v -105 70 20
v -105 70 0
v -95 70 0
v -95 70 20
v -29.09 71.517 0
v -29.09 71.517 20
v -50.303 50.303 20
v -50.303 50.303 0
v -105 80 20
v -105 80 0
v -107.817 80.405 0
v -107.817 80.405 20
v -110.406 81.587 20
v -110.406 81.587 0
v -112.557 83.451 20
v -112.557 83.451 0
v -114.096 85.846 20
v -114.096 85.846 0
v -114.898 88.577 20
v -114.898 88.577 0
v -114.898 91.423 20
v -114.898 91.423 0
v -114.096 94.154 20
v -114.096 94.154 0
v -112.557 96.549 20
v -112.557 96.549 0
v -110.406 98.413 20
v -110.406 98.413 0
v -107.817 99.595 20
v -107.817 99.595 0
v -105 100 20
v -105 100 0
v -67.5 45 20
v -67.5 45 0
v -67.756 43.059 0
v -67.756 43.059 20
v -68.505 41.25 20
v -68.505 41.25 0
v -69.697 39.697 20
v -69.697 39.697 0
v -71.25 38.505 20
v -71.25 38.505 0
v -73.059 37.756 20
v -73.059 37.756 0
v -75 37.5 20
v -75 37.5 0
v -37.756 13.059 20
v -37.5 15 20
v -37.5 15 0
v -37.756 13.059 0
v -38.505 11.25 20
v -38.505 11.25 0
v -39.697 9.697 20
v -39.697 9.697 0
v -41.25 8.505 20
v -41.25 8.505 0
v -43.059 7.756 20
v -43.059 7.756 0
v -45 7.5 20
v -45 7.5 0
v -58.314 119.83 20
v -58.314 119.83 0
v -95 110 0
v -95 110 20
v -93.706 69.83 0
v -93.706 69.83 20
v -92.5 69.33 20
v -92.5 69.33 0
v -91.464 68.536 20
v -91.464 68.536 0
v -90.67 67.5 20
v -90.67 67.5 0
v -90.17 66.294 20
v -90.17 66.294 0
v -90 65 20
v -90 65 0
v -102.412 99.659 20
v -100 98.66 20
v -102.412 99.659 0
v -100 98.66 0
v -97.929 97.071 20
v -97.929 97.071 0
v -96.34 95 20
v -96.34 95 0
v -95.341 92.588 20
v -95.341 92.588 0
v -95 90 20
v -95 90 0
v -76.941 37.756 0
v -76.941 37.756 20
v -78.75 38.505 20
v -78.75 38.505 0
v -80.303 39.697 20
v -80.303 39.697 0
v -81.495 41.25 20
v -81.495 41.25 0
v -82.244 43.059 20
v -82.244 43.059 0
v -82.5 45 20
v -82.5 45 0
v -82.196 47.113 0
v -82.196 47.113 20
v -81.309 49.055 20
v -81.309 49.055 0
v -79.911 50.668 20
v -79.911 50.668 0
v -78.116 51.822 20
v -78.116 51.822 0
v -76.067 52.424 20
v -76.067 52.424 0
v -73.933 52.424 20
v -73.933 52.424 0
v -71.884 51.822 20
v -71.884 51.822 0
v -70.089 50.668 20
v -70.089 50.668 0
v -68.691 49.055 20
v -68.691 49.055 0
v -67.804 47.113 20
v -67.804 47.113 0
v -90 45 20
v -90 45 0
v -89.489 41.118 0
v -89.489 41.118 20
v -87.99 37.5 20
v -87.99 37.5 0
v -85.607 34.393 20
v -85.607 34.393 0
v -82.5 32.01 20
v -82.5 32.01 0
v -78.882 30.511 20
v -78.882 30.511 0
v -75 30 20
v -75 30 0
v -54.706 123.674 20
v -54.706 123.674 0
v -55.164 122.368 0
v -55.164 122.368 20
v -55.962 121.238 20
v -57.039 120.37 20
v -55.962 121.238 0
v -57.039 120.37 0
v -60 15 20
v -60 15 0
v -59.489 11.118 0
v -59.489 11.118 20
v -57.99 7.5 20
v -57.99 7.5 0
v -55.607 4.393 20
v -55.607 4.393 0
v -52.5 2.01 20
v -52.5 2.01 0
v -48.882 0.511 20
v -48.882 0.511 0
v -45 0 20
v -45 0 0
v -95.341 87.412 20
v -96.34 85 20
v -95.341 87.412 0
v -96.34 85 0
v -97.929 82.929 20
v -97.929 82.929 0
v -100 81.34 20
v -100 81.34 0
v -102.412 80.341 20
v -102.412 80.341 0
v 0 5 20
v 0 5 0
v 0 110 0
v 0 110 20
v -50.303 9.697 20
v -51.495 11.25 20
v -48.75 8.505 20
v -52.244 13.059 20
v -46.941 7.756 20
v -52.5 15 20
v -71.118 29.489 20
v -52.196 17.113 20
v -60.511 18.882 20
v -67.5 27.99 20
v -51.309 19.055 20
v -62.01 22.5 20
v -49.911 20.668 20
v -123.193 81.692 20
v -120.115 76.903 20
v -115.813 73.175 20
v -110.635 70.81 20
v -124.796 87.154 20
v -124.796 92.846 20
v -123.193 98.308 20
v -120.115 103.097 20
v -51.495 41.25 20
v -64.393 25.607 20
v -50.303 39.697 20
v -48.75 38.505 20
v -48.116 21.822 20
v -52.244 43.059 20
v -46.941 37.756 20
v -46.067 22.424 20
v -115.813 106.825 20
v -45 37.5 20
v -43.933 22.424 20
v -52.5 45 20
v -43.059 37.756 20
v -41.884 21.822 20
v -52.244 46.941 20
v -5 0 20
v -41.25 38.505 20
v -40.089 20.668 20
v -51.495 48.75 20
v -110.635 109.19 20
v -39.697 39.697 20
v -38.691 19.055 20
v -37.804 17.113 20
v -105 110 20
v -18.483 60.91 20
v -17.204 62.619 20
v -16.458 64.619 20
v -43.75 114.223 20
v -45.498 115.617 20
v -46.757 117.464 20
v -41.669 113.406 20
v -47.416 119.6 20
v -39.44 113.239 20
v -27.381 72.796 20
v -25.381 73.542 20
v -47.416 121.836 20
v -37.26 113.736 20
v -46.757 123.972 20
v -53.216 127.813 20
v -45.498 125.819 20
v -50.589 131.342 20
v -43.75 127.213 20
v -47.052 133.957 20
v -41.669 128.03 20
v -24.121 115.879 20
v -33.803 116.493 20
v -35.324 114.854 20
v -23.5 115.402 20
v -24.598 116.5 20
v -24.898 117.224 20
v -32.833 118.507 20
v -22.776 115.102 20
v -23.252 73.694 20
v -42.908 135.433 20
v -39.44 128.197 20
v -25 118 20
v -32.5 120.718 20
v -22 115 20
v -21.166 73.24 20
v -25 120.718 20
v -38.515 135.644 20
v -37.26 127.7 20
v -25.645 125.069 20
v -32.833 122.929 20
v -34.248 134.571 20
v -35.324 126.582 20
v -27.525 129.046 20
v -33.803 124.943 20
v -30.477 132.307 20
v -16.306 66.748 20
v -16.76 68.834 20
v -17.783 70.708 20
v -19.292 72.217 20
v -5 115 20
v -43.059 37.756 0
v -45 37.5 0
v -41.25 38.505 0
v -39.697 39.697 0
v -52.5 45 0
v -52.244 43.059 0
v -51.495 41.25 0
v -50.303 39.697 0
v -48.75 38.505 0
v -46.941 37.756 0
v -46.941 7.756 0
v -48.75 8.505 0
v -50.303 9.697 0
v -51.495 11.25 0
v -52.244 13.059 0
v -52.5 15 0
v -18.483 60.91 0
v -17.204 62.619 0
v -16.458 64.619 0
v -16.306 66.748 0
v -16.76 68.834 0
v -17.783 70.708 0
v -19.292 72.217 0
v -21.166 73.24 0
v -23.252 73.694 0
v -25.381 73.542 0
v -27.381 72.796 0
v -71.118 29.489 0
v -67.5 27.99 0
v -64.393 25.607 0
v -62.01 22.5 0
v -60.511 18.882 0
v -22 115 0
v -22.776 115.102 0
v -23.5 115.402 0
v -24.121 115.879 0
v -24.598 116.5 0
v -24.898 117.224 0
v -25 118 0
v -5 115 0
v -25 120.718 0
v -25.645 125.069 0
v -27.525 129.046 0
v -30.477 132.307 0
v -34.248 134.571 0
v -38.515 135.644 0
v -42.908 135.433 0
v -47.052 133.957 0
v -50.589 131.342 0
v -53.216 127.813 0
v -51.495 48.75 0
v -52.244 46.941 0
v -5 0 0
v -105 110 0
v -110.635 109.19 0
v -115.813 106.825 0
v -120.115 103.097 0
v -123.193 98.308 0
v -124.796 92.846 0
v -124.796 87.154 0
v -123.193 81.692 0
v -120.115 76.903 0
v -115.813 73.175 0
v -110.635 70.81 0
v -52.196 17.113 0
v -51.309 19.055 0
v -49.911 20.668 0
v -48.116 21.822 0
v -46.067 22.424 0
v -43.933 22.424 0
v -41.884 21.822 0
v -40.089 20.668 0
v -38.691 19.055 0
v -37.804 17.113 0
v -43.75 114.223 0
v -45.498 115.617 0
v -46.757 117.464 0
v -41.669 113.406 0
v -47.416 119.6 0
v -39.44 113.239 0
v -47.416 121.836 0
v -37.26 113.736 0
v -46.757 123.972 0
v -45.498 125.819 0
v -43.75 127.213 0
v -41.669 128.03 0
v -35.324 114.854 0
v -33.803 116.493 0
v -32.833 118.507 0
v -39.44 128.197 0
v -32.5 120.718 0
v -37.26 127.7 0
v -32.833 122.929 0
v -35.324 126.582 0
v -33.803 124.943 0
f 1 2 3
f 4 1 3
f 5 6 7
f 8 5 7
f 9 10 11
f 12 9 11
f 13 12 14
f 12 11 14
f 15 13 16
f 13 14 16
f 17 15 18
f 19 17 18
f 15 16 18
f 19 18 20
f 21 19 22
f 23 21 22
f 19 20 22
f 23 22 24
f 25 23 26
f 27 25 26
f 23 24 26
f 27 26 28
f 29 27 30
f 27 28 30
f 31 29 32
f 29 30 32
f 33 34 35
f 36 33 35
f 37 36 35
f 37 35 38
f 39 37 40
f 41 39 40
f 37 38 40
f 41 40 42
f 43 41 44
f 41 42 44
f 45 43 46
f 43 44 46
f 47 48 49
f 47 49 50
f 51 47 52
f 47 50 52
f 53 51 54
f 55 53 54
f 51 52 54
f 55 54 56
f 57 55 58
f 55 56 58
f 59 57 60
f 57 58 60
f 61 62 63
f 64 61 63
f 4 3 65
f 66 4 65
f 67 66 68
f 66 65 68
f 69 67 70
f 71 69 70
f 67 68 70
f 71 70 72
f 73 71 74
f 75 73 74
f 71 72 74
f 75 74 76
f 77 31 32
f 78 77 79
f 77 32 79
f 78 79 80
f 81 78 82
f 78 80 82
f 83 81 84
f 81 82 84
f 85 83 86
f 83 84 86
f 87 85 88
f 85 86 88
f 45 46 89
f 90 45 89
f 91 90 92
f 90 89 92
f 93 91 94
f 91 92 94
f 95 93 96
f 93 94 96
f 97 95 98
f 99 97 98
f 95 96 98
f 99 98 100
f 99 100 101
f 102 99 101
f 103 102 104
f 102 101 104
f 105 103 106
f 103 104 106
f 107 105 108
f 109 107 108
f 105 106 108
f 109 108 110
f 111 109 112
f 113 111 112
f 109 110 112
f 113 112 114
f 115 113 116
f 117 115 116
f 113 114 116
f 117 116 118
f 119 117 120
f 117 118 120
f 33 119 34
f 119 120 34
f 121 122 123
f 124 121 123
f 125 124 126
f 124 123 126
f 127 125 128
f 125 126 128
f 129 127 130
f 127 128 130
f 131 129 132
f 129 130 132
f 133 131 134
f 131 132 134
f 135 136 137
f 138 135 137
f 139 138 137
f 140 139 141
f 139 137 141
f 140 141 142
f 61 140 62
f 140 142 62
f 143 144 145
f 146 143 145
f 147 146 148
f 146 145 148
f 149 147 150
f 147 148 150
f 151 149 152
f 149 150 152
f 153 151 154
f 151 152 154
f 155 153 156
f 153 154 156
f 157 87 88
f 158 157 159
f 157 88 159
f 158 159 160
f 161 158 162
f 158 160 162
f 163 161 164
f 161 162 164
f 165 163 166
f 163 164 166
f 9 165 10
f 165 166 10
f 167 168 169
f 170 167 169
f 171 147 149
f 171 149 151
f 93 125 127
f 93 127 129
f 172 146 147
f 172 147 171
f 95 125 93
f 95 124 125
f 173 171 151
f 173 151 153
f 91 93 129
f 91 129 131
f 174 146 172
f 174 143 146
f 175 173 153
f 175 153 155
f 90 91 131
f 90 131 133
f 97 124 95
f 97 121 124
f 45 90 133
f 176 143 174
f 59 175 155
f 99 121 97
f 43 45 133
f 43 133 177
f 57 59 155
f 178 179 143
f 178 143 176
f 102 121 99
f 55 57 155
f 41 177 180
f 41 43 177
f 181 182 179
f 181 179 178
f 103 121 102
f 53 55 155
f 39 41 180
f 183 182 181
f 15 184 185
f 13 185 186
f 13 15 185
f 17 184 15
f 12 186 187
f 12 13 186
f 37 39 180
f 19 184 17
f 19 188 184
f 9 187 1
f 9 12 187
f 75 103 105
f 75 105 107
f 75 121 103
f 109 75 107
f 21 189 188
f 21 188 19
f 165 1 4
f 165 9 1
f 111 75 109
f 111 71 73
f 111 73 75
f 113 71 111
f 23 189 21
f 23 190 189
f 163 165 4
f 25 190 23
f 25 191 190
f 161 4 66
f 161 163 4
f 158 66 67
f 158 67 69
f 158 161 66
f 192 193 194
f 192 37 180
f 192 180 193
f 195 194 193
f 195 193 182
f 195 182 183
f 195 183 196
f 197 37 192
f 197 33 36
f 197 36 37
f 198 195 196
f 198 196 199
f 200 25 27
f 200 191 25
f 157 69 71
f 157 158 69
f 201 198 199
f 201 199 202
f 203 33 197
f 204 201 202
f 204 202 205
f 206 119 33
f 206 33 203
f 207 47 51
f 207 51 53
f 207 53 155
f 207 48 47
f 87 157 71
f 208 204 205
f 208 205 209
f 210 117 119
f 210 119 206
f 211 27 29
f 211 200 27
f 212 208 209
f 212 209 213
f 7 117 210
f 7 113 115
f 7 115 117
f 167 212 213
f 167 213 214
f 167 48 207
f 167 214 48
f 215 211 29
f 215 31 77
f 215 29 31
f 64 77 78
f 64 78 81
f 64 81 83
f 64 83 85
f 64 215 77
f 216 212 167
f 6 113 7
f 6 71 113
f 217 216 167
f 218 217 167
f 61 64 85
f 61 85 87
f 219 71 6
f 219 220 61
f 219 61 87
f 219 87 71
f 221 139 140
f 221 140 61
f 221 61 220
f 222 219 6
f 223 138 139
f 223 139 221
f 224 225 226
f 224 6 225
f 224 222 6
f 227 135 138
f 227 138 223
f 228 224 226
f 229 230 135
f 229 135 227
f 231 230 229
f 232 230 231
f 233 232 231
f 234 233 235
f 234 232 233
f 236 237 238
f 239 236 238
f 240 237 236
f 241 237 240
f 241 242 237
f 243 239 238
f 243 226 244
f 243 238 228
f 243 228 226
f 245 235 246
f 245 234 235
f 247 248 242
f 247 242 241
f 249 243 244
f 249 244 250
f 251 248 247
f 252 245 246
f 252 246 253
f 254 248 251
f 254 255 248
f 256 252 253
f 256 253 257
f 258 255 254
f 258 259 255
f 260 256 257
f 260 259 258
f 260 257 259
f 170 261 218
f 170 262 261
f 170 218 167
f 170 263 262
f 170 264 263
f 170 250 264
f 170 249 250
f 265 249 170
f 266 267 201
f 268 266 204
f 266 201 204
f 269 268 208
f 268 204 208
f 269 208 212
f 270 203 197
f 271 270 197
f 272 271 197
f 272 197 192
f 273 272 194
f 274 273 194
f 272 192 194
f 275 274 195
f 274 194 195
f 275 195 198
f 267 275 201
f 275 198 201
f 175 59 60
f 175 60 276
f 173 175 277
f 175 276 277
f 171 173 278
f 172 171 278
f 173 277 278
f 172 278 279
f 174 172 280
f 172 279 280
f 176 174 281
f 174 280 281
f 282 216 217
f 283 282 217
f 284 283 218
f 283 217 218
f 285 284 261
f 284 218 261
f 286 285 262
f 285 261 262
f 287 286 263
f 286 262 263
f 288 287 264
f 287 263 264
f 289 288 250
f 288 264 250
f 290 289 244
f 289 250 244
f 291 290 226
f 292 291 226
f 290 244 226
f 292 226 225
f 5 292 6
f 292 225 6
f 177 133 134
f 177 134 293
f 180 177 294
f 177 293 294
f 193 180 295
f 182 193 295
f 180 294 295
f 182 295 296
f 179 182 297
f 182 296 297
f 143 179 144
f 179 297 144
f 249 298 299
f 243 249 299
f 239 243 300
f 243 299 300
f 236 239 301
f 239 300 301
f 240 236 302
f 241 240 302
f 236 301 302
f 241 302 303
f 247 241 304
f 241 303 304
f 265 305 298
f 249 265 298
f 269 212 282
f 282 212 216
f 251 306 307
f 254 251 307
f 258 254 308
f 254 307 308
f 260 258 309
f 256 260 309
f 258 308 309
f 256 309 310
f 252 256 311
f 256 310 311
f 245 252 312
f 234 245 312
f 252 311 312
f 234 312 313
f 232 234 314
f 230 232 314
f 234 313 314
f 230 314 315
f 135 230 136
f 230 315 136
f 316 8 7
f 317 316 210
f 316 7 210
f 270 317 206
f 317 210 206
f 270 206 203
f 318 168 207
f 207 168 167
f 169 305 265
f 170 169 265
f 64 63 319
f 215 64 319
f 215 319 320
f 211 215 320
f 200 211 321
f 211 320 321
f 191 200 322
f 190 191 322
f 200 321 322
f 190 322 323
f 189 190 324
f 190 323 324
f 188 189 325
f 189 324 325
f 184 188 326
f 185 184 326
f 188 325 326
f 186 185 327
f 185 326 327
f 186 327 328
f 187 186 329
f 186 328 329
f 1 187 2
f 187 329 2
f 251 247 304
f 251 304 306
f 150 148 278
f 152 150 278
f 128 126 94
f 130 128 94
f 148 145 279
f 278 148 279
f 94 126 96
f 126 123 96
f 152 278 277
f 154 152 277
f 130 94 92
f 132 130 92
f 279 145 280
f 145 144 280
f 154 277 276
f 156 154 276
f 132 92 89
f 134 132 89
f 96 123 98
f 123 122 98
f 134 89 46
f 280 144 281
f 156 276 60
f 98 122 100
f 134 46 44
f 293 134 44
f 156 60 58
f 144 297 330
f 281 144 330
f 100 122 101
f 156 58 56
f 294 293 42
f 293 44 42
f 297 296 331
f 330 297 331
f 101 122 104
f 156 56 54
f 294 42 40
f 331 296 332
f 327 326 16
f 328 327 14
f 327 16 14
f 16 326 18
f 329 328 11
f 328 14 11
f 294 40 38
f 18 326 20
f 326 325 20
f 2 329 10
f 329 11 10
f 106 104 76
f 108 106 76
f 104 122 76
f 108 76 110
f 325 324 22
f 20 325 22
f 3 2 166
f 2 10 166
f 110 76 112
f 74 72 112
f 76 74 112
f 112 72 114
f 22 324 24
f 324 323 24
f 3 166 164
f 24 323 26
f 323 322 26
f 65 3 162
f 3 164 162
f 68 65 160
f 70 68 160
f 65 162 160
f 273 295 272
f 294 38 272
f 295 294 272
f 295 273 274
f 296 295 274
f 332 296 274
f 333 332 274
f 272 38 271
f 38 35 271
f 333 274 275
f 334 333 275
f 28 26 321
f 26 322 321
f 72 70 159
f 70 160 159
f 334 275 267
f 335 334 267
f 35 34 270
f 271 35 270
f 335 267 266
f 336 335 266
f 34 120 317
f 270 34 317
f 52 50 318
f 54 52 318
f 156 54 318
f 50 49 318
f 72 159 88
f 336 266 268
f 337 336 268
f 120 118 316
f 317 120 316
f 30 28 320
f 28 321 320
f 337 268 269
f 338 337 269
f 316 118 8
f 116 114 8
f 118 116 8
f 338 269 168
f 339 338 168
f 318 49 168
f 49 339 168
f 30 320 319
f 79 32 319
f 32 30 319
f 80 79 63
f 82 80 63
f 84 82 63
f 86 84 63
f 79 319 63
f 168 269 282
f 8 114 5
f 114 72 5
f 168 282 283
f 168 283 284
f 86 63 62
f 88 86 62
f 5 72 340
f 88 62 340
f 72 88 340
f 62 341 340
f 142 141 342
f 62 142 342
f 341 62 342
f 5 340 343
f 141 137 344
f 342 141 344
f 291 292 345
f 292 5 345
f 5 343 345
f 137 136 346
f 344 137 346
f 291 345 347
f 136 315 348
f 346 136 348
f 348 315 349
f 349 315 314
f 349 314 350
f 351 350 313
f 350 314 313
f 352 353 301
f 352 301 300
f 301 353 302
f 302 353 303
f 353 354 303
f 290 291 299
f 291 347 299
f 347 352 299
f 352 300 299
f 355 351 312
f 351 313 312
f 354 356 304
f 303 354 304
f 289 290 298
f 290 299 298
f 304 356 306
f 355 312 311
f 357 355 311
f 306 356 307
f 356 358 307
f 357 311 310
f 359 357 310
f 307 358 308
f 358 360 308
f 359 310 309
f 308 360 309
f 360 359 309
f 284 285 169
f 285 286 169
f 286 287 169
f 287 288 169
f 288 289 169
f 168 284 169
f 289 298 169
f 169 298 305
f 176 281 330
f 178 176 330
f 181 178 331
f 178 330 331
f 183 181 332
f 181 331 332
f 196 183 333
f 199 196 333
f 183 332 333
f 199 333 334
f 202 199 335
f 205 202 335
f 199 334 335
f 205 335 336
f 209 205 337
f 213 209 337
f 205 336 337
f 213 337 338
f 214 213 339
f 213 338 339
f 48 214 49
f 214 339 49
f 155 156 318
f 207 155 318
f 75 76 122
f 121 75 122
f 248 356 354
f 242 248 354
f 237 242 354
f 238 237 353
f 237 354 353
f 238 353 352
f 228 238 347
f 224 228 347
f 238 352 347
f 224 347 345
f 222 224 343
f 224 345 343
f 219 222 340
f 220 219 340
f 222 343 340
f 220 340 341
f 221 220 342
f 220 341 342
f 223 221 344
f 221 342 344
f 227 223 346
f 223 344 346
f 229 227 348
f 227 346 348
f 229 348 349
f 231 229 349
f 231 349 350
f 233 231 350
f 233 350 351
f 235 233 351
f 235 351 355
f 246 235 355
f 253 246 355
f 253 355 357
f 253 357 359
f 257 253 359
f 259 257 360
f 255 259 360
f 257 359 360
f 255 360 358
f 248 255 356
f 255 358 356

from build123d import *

# Parameters (mm, degrees)
F1_DEPTH = 20
F2_SIZE  = 5
F4_DEPTH = 25


with BuildPart() as f1:
    # F0 (on Top) → F1 (new body)
    with BuildSketch(Plane.XY):
        with BuildLine():
            Line((-45, 0), (0, 0))
            Line((0, 0), (0, 115))
            Line((0, 115), (-22, 115))
            ThreePointArc((-22, 115), (-24.12132, 115.87868), (-25, 118))
            Line((-25, 118), (-25, 120.717968))
            ThreePointArc((-25, 120.717968), (-38.514543, 135.644234), (-54.705789, 123.674277))
            ThreePointArc((-54.705789, 123.674277), (-55.961881, 121.238038), (-58.313624, 119.830085))
            Line((-58.313624, 119.830085), (-95, 110))
            Line((-95, 110), (-105, 110))
            Line((-105, 110), (-105, 100))
            ThreePointArc((-105, 100), (-97.928932, 97.071068), (-95, 90))
            ThreePointArc((-95, 90), (-97.928932, 82.928932), (-105, 80))
            Line((-105, 80), (-105, 70))
            Line((-105, 70), (-95, 70))
            ThreePointArc((-95, 70), (-91.464466, 68.535534), (-90, 65))
            Line((-90, 65), (-90, 45))
            Line((-90, 45), (-82.5, 45))
            ThreePointArc((-82.5, 45), (-75, 52.5), (-67.5, 45))
            ThreePointArc((-67.5, 45), (-69.696699, 39.696699), (-75, 37.5))
            Line((-75, 37.5), (-75, 30))
            ThreePointArc((-75, 30), (-64.393398, 25.606602), (-60, 15))
            Line((-60, 15), (-52.5, 15))
            ThreePointArc((-52.5, 15), (-45, 22.5), (-37.5, 15))
            ThreePointArc((-37.5, 15), (-39.696699, 9.696699), (-45, 7.5))
            Line((-45, 7.5), (-45, 0))
        make_face()
        with BuildLine():
            ThreePointArc((-47.5, 120.717968), (-40, 128.217968), (-32.5, 120.717968))
            ThreePointArc((-32.5, 120.717968), (-40, 113.217968), (-47.5, 120.717968))
        make_face(mode=Mode.SUBTRACT)
        with BuildLine():
            ThreePointArc((-105, 110), (-125, 90), (-105, 70))
            Line((-105, 70), (-105, 80))
            ThreePointArc((-105, 80), (-115, 90), (-105, 100))
            Line((-105, 100), (-105, 110))
        make_face()
        with BuildLine():
            ThreePointArc((-60, 15), (-55.606602, 4.393398), (-45, 0))
            Line((-45, 0), (-45, 7.5))
            ThreePointArc((-45, 7.5), (-50.303301, 9.696699), (-52.5, 15))
            Line((-52.5, 15), (-60, 15))
        make_face()
        with BuildLine():
            ThreePointArc((-90, 45), (-85.606602, 34.393398), (-75, 30))
            Line((-75, 30), (-75, 37.5))
            ThreePointArc((-75, 37.5), (-80.303301, 39.696699), (-82.5, 45))
            Line((-82.5, 45), (-90, 45))
        make_face()
    extrude(amount=F1_DEPTH)

    # F2
    f2_edges = [f1.edges().sort_by_distance(p)[0] for p in [
        (0, 115, 10),
        (0, 0, 10),
    ]]
    chamfer(f2_edges, length=F2_SIZE)

    # F3 (on face) → F4 (cut)
    with BuildSketch(Plane.XY.offset(20)):
        with BuildLine():
            Line((-45, 45), (-45, 37.5))
            ThreePointArc((-45, 37.5), (-42.129874, 38.070904), (-39.696699, 39.696699))
            Line((-39.696699, 39.696699), (-18.483496, 60.909903))
            ThreePointArc((-18.483496, 60.909903), (-18.483496, 71.516504), (-29.090097, 71.516504))
            Line((-29.090097, 71.516504), (-50.303301, 50.303301))
            ThreePointArc((-50.303301, 50.303301), (-51.929096, 47.870126), (-52.5, 45))
            Line((-52.5, 45), (-45, 45))
        make_face()
        with BuildLine():
            ThreePointArc((-52.5, 45), (-50.303301, 39.696699), (-45, 37.5))
            Line((-45, 37.5), (-45, 45))
            Line((-45, 45), (-52.5, 45))
        make_face()
    extrude(amount=-F4_DEPTH, mode=Mode.SUBTRACT)


solid = f1.part
